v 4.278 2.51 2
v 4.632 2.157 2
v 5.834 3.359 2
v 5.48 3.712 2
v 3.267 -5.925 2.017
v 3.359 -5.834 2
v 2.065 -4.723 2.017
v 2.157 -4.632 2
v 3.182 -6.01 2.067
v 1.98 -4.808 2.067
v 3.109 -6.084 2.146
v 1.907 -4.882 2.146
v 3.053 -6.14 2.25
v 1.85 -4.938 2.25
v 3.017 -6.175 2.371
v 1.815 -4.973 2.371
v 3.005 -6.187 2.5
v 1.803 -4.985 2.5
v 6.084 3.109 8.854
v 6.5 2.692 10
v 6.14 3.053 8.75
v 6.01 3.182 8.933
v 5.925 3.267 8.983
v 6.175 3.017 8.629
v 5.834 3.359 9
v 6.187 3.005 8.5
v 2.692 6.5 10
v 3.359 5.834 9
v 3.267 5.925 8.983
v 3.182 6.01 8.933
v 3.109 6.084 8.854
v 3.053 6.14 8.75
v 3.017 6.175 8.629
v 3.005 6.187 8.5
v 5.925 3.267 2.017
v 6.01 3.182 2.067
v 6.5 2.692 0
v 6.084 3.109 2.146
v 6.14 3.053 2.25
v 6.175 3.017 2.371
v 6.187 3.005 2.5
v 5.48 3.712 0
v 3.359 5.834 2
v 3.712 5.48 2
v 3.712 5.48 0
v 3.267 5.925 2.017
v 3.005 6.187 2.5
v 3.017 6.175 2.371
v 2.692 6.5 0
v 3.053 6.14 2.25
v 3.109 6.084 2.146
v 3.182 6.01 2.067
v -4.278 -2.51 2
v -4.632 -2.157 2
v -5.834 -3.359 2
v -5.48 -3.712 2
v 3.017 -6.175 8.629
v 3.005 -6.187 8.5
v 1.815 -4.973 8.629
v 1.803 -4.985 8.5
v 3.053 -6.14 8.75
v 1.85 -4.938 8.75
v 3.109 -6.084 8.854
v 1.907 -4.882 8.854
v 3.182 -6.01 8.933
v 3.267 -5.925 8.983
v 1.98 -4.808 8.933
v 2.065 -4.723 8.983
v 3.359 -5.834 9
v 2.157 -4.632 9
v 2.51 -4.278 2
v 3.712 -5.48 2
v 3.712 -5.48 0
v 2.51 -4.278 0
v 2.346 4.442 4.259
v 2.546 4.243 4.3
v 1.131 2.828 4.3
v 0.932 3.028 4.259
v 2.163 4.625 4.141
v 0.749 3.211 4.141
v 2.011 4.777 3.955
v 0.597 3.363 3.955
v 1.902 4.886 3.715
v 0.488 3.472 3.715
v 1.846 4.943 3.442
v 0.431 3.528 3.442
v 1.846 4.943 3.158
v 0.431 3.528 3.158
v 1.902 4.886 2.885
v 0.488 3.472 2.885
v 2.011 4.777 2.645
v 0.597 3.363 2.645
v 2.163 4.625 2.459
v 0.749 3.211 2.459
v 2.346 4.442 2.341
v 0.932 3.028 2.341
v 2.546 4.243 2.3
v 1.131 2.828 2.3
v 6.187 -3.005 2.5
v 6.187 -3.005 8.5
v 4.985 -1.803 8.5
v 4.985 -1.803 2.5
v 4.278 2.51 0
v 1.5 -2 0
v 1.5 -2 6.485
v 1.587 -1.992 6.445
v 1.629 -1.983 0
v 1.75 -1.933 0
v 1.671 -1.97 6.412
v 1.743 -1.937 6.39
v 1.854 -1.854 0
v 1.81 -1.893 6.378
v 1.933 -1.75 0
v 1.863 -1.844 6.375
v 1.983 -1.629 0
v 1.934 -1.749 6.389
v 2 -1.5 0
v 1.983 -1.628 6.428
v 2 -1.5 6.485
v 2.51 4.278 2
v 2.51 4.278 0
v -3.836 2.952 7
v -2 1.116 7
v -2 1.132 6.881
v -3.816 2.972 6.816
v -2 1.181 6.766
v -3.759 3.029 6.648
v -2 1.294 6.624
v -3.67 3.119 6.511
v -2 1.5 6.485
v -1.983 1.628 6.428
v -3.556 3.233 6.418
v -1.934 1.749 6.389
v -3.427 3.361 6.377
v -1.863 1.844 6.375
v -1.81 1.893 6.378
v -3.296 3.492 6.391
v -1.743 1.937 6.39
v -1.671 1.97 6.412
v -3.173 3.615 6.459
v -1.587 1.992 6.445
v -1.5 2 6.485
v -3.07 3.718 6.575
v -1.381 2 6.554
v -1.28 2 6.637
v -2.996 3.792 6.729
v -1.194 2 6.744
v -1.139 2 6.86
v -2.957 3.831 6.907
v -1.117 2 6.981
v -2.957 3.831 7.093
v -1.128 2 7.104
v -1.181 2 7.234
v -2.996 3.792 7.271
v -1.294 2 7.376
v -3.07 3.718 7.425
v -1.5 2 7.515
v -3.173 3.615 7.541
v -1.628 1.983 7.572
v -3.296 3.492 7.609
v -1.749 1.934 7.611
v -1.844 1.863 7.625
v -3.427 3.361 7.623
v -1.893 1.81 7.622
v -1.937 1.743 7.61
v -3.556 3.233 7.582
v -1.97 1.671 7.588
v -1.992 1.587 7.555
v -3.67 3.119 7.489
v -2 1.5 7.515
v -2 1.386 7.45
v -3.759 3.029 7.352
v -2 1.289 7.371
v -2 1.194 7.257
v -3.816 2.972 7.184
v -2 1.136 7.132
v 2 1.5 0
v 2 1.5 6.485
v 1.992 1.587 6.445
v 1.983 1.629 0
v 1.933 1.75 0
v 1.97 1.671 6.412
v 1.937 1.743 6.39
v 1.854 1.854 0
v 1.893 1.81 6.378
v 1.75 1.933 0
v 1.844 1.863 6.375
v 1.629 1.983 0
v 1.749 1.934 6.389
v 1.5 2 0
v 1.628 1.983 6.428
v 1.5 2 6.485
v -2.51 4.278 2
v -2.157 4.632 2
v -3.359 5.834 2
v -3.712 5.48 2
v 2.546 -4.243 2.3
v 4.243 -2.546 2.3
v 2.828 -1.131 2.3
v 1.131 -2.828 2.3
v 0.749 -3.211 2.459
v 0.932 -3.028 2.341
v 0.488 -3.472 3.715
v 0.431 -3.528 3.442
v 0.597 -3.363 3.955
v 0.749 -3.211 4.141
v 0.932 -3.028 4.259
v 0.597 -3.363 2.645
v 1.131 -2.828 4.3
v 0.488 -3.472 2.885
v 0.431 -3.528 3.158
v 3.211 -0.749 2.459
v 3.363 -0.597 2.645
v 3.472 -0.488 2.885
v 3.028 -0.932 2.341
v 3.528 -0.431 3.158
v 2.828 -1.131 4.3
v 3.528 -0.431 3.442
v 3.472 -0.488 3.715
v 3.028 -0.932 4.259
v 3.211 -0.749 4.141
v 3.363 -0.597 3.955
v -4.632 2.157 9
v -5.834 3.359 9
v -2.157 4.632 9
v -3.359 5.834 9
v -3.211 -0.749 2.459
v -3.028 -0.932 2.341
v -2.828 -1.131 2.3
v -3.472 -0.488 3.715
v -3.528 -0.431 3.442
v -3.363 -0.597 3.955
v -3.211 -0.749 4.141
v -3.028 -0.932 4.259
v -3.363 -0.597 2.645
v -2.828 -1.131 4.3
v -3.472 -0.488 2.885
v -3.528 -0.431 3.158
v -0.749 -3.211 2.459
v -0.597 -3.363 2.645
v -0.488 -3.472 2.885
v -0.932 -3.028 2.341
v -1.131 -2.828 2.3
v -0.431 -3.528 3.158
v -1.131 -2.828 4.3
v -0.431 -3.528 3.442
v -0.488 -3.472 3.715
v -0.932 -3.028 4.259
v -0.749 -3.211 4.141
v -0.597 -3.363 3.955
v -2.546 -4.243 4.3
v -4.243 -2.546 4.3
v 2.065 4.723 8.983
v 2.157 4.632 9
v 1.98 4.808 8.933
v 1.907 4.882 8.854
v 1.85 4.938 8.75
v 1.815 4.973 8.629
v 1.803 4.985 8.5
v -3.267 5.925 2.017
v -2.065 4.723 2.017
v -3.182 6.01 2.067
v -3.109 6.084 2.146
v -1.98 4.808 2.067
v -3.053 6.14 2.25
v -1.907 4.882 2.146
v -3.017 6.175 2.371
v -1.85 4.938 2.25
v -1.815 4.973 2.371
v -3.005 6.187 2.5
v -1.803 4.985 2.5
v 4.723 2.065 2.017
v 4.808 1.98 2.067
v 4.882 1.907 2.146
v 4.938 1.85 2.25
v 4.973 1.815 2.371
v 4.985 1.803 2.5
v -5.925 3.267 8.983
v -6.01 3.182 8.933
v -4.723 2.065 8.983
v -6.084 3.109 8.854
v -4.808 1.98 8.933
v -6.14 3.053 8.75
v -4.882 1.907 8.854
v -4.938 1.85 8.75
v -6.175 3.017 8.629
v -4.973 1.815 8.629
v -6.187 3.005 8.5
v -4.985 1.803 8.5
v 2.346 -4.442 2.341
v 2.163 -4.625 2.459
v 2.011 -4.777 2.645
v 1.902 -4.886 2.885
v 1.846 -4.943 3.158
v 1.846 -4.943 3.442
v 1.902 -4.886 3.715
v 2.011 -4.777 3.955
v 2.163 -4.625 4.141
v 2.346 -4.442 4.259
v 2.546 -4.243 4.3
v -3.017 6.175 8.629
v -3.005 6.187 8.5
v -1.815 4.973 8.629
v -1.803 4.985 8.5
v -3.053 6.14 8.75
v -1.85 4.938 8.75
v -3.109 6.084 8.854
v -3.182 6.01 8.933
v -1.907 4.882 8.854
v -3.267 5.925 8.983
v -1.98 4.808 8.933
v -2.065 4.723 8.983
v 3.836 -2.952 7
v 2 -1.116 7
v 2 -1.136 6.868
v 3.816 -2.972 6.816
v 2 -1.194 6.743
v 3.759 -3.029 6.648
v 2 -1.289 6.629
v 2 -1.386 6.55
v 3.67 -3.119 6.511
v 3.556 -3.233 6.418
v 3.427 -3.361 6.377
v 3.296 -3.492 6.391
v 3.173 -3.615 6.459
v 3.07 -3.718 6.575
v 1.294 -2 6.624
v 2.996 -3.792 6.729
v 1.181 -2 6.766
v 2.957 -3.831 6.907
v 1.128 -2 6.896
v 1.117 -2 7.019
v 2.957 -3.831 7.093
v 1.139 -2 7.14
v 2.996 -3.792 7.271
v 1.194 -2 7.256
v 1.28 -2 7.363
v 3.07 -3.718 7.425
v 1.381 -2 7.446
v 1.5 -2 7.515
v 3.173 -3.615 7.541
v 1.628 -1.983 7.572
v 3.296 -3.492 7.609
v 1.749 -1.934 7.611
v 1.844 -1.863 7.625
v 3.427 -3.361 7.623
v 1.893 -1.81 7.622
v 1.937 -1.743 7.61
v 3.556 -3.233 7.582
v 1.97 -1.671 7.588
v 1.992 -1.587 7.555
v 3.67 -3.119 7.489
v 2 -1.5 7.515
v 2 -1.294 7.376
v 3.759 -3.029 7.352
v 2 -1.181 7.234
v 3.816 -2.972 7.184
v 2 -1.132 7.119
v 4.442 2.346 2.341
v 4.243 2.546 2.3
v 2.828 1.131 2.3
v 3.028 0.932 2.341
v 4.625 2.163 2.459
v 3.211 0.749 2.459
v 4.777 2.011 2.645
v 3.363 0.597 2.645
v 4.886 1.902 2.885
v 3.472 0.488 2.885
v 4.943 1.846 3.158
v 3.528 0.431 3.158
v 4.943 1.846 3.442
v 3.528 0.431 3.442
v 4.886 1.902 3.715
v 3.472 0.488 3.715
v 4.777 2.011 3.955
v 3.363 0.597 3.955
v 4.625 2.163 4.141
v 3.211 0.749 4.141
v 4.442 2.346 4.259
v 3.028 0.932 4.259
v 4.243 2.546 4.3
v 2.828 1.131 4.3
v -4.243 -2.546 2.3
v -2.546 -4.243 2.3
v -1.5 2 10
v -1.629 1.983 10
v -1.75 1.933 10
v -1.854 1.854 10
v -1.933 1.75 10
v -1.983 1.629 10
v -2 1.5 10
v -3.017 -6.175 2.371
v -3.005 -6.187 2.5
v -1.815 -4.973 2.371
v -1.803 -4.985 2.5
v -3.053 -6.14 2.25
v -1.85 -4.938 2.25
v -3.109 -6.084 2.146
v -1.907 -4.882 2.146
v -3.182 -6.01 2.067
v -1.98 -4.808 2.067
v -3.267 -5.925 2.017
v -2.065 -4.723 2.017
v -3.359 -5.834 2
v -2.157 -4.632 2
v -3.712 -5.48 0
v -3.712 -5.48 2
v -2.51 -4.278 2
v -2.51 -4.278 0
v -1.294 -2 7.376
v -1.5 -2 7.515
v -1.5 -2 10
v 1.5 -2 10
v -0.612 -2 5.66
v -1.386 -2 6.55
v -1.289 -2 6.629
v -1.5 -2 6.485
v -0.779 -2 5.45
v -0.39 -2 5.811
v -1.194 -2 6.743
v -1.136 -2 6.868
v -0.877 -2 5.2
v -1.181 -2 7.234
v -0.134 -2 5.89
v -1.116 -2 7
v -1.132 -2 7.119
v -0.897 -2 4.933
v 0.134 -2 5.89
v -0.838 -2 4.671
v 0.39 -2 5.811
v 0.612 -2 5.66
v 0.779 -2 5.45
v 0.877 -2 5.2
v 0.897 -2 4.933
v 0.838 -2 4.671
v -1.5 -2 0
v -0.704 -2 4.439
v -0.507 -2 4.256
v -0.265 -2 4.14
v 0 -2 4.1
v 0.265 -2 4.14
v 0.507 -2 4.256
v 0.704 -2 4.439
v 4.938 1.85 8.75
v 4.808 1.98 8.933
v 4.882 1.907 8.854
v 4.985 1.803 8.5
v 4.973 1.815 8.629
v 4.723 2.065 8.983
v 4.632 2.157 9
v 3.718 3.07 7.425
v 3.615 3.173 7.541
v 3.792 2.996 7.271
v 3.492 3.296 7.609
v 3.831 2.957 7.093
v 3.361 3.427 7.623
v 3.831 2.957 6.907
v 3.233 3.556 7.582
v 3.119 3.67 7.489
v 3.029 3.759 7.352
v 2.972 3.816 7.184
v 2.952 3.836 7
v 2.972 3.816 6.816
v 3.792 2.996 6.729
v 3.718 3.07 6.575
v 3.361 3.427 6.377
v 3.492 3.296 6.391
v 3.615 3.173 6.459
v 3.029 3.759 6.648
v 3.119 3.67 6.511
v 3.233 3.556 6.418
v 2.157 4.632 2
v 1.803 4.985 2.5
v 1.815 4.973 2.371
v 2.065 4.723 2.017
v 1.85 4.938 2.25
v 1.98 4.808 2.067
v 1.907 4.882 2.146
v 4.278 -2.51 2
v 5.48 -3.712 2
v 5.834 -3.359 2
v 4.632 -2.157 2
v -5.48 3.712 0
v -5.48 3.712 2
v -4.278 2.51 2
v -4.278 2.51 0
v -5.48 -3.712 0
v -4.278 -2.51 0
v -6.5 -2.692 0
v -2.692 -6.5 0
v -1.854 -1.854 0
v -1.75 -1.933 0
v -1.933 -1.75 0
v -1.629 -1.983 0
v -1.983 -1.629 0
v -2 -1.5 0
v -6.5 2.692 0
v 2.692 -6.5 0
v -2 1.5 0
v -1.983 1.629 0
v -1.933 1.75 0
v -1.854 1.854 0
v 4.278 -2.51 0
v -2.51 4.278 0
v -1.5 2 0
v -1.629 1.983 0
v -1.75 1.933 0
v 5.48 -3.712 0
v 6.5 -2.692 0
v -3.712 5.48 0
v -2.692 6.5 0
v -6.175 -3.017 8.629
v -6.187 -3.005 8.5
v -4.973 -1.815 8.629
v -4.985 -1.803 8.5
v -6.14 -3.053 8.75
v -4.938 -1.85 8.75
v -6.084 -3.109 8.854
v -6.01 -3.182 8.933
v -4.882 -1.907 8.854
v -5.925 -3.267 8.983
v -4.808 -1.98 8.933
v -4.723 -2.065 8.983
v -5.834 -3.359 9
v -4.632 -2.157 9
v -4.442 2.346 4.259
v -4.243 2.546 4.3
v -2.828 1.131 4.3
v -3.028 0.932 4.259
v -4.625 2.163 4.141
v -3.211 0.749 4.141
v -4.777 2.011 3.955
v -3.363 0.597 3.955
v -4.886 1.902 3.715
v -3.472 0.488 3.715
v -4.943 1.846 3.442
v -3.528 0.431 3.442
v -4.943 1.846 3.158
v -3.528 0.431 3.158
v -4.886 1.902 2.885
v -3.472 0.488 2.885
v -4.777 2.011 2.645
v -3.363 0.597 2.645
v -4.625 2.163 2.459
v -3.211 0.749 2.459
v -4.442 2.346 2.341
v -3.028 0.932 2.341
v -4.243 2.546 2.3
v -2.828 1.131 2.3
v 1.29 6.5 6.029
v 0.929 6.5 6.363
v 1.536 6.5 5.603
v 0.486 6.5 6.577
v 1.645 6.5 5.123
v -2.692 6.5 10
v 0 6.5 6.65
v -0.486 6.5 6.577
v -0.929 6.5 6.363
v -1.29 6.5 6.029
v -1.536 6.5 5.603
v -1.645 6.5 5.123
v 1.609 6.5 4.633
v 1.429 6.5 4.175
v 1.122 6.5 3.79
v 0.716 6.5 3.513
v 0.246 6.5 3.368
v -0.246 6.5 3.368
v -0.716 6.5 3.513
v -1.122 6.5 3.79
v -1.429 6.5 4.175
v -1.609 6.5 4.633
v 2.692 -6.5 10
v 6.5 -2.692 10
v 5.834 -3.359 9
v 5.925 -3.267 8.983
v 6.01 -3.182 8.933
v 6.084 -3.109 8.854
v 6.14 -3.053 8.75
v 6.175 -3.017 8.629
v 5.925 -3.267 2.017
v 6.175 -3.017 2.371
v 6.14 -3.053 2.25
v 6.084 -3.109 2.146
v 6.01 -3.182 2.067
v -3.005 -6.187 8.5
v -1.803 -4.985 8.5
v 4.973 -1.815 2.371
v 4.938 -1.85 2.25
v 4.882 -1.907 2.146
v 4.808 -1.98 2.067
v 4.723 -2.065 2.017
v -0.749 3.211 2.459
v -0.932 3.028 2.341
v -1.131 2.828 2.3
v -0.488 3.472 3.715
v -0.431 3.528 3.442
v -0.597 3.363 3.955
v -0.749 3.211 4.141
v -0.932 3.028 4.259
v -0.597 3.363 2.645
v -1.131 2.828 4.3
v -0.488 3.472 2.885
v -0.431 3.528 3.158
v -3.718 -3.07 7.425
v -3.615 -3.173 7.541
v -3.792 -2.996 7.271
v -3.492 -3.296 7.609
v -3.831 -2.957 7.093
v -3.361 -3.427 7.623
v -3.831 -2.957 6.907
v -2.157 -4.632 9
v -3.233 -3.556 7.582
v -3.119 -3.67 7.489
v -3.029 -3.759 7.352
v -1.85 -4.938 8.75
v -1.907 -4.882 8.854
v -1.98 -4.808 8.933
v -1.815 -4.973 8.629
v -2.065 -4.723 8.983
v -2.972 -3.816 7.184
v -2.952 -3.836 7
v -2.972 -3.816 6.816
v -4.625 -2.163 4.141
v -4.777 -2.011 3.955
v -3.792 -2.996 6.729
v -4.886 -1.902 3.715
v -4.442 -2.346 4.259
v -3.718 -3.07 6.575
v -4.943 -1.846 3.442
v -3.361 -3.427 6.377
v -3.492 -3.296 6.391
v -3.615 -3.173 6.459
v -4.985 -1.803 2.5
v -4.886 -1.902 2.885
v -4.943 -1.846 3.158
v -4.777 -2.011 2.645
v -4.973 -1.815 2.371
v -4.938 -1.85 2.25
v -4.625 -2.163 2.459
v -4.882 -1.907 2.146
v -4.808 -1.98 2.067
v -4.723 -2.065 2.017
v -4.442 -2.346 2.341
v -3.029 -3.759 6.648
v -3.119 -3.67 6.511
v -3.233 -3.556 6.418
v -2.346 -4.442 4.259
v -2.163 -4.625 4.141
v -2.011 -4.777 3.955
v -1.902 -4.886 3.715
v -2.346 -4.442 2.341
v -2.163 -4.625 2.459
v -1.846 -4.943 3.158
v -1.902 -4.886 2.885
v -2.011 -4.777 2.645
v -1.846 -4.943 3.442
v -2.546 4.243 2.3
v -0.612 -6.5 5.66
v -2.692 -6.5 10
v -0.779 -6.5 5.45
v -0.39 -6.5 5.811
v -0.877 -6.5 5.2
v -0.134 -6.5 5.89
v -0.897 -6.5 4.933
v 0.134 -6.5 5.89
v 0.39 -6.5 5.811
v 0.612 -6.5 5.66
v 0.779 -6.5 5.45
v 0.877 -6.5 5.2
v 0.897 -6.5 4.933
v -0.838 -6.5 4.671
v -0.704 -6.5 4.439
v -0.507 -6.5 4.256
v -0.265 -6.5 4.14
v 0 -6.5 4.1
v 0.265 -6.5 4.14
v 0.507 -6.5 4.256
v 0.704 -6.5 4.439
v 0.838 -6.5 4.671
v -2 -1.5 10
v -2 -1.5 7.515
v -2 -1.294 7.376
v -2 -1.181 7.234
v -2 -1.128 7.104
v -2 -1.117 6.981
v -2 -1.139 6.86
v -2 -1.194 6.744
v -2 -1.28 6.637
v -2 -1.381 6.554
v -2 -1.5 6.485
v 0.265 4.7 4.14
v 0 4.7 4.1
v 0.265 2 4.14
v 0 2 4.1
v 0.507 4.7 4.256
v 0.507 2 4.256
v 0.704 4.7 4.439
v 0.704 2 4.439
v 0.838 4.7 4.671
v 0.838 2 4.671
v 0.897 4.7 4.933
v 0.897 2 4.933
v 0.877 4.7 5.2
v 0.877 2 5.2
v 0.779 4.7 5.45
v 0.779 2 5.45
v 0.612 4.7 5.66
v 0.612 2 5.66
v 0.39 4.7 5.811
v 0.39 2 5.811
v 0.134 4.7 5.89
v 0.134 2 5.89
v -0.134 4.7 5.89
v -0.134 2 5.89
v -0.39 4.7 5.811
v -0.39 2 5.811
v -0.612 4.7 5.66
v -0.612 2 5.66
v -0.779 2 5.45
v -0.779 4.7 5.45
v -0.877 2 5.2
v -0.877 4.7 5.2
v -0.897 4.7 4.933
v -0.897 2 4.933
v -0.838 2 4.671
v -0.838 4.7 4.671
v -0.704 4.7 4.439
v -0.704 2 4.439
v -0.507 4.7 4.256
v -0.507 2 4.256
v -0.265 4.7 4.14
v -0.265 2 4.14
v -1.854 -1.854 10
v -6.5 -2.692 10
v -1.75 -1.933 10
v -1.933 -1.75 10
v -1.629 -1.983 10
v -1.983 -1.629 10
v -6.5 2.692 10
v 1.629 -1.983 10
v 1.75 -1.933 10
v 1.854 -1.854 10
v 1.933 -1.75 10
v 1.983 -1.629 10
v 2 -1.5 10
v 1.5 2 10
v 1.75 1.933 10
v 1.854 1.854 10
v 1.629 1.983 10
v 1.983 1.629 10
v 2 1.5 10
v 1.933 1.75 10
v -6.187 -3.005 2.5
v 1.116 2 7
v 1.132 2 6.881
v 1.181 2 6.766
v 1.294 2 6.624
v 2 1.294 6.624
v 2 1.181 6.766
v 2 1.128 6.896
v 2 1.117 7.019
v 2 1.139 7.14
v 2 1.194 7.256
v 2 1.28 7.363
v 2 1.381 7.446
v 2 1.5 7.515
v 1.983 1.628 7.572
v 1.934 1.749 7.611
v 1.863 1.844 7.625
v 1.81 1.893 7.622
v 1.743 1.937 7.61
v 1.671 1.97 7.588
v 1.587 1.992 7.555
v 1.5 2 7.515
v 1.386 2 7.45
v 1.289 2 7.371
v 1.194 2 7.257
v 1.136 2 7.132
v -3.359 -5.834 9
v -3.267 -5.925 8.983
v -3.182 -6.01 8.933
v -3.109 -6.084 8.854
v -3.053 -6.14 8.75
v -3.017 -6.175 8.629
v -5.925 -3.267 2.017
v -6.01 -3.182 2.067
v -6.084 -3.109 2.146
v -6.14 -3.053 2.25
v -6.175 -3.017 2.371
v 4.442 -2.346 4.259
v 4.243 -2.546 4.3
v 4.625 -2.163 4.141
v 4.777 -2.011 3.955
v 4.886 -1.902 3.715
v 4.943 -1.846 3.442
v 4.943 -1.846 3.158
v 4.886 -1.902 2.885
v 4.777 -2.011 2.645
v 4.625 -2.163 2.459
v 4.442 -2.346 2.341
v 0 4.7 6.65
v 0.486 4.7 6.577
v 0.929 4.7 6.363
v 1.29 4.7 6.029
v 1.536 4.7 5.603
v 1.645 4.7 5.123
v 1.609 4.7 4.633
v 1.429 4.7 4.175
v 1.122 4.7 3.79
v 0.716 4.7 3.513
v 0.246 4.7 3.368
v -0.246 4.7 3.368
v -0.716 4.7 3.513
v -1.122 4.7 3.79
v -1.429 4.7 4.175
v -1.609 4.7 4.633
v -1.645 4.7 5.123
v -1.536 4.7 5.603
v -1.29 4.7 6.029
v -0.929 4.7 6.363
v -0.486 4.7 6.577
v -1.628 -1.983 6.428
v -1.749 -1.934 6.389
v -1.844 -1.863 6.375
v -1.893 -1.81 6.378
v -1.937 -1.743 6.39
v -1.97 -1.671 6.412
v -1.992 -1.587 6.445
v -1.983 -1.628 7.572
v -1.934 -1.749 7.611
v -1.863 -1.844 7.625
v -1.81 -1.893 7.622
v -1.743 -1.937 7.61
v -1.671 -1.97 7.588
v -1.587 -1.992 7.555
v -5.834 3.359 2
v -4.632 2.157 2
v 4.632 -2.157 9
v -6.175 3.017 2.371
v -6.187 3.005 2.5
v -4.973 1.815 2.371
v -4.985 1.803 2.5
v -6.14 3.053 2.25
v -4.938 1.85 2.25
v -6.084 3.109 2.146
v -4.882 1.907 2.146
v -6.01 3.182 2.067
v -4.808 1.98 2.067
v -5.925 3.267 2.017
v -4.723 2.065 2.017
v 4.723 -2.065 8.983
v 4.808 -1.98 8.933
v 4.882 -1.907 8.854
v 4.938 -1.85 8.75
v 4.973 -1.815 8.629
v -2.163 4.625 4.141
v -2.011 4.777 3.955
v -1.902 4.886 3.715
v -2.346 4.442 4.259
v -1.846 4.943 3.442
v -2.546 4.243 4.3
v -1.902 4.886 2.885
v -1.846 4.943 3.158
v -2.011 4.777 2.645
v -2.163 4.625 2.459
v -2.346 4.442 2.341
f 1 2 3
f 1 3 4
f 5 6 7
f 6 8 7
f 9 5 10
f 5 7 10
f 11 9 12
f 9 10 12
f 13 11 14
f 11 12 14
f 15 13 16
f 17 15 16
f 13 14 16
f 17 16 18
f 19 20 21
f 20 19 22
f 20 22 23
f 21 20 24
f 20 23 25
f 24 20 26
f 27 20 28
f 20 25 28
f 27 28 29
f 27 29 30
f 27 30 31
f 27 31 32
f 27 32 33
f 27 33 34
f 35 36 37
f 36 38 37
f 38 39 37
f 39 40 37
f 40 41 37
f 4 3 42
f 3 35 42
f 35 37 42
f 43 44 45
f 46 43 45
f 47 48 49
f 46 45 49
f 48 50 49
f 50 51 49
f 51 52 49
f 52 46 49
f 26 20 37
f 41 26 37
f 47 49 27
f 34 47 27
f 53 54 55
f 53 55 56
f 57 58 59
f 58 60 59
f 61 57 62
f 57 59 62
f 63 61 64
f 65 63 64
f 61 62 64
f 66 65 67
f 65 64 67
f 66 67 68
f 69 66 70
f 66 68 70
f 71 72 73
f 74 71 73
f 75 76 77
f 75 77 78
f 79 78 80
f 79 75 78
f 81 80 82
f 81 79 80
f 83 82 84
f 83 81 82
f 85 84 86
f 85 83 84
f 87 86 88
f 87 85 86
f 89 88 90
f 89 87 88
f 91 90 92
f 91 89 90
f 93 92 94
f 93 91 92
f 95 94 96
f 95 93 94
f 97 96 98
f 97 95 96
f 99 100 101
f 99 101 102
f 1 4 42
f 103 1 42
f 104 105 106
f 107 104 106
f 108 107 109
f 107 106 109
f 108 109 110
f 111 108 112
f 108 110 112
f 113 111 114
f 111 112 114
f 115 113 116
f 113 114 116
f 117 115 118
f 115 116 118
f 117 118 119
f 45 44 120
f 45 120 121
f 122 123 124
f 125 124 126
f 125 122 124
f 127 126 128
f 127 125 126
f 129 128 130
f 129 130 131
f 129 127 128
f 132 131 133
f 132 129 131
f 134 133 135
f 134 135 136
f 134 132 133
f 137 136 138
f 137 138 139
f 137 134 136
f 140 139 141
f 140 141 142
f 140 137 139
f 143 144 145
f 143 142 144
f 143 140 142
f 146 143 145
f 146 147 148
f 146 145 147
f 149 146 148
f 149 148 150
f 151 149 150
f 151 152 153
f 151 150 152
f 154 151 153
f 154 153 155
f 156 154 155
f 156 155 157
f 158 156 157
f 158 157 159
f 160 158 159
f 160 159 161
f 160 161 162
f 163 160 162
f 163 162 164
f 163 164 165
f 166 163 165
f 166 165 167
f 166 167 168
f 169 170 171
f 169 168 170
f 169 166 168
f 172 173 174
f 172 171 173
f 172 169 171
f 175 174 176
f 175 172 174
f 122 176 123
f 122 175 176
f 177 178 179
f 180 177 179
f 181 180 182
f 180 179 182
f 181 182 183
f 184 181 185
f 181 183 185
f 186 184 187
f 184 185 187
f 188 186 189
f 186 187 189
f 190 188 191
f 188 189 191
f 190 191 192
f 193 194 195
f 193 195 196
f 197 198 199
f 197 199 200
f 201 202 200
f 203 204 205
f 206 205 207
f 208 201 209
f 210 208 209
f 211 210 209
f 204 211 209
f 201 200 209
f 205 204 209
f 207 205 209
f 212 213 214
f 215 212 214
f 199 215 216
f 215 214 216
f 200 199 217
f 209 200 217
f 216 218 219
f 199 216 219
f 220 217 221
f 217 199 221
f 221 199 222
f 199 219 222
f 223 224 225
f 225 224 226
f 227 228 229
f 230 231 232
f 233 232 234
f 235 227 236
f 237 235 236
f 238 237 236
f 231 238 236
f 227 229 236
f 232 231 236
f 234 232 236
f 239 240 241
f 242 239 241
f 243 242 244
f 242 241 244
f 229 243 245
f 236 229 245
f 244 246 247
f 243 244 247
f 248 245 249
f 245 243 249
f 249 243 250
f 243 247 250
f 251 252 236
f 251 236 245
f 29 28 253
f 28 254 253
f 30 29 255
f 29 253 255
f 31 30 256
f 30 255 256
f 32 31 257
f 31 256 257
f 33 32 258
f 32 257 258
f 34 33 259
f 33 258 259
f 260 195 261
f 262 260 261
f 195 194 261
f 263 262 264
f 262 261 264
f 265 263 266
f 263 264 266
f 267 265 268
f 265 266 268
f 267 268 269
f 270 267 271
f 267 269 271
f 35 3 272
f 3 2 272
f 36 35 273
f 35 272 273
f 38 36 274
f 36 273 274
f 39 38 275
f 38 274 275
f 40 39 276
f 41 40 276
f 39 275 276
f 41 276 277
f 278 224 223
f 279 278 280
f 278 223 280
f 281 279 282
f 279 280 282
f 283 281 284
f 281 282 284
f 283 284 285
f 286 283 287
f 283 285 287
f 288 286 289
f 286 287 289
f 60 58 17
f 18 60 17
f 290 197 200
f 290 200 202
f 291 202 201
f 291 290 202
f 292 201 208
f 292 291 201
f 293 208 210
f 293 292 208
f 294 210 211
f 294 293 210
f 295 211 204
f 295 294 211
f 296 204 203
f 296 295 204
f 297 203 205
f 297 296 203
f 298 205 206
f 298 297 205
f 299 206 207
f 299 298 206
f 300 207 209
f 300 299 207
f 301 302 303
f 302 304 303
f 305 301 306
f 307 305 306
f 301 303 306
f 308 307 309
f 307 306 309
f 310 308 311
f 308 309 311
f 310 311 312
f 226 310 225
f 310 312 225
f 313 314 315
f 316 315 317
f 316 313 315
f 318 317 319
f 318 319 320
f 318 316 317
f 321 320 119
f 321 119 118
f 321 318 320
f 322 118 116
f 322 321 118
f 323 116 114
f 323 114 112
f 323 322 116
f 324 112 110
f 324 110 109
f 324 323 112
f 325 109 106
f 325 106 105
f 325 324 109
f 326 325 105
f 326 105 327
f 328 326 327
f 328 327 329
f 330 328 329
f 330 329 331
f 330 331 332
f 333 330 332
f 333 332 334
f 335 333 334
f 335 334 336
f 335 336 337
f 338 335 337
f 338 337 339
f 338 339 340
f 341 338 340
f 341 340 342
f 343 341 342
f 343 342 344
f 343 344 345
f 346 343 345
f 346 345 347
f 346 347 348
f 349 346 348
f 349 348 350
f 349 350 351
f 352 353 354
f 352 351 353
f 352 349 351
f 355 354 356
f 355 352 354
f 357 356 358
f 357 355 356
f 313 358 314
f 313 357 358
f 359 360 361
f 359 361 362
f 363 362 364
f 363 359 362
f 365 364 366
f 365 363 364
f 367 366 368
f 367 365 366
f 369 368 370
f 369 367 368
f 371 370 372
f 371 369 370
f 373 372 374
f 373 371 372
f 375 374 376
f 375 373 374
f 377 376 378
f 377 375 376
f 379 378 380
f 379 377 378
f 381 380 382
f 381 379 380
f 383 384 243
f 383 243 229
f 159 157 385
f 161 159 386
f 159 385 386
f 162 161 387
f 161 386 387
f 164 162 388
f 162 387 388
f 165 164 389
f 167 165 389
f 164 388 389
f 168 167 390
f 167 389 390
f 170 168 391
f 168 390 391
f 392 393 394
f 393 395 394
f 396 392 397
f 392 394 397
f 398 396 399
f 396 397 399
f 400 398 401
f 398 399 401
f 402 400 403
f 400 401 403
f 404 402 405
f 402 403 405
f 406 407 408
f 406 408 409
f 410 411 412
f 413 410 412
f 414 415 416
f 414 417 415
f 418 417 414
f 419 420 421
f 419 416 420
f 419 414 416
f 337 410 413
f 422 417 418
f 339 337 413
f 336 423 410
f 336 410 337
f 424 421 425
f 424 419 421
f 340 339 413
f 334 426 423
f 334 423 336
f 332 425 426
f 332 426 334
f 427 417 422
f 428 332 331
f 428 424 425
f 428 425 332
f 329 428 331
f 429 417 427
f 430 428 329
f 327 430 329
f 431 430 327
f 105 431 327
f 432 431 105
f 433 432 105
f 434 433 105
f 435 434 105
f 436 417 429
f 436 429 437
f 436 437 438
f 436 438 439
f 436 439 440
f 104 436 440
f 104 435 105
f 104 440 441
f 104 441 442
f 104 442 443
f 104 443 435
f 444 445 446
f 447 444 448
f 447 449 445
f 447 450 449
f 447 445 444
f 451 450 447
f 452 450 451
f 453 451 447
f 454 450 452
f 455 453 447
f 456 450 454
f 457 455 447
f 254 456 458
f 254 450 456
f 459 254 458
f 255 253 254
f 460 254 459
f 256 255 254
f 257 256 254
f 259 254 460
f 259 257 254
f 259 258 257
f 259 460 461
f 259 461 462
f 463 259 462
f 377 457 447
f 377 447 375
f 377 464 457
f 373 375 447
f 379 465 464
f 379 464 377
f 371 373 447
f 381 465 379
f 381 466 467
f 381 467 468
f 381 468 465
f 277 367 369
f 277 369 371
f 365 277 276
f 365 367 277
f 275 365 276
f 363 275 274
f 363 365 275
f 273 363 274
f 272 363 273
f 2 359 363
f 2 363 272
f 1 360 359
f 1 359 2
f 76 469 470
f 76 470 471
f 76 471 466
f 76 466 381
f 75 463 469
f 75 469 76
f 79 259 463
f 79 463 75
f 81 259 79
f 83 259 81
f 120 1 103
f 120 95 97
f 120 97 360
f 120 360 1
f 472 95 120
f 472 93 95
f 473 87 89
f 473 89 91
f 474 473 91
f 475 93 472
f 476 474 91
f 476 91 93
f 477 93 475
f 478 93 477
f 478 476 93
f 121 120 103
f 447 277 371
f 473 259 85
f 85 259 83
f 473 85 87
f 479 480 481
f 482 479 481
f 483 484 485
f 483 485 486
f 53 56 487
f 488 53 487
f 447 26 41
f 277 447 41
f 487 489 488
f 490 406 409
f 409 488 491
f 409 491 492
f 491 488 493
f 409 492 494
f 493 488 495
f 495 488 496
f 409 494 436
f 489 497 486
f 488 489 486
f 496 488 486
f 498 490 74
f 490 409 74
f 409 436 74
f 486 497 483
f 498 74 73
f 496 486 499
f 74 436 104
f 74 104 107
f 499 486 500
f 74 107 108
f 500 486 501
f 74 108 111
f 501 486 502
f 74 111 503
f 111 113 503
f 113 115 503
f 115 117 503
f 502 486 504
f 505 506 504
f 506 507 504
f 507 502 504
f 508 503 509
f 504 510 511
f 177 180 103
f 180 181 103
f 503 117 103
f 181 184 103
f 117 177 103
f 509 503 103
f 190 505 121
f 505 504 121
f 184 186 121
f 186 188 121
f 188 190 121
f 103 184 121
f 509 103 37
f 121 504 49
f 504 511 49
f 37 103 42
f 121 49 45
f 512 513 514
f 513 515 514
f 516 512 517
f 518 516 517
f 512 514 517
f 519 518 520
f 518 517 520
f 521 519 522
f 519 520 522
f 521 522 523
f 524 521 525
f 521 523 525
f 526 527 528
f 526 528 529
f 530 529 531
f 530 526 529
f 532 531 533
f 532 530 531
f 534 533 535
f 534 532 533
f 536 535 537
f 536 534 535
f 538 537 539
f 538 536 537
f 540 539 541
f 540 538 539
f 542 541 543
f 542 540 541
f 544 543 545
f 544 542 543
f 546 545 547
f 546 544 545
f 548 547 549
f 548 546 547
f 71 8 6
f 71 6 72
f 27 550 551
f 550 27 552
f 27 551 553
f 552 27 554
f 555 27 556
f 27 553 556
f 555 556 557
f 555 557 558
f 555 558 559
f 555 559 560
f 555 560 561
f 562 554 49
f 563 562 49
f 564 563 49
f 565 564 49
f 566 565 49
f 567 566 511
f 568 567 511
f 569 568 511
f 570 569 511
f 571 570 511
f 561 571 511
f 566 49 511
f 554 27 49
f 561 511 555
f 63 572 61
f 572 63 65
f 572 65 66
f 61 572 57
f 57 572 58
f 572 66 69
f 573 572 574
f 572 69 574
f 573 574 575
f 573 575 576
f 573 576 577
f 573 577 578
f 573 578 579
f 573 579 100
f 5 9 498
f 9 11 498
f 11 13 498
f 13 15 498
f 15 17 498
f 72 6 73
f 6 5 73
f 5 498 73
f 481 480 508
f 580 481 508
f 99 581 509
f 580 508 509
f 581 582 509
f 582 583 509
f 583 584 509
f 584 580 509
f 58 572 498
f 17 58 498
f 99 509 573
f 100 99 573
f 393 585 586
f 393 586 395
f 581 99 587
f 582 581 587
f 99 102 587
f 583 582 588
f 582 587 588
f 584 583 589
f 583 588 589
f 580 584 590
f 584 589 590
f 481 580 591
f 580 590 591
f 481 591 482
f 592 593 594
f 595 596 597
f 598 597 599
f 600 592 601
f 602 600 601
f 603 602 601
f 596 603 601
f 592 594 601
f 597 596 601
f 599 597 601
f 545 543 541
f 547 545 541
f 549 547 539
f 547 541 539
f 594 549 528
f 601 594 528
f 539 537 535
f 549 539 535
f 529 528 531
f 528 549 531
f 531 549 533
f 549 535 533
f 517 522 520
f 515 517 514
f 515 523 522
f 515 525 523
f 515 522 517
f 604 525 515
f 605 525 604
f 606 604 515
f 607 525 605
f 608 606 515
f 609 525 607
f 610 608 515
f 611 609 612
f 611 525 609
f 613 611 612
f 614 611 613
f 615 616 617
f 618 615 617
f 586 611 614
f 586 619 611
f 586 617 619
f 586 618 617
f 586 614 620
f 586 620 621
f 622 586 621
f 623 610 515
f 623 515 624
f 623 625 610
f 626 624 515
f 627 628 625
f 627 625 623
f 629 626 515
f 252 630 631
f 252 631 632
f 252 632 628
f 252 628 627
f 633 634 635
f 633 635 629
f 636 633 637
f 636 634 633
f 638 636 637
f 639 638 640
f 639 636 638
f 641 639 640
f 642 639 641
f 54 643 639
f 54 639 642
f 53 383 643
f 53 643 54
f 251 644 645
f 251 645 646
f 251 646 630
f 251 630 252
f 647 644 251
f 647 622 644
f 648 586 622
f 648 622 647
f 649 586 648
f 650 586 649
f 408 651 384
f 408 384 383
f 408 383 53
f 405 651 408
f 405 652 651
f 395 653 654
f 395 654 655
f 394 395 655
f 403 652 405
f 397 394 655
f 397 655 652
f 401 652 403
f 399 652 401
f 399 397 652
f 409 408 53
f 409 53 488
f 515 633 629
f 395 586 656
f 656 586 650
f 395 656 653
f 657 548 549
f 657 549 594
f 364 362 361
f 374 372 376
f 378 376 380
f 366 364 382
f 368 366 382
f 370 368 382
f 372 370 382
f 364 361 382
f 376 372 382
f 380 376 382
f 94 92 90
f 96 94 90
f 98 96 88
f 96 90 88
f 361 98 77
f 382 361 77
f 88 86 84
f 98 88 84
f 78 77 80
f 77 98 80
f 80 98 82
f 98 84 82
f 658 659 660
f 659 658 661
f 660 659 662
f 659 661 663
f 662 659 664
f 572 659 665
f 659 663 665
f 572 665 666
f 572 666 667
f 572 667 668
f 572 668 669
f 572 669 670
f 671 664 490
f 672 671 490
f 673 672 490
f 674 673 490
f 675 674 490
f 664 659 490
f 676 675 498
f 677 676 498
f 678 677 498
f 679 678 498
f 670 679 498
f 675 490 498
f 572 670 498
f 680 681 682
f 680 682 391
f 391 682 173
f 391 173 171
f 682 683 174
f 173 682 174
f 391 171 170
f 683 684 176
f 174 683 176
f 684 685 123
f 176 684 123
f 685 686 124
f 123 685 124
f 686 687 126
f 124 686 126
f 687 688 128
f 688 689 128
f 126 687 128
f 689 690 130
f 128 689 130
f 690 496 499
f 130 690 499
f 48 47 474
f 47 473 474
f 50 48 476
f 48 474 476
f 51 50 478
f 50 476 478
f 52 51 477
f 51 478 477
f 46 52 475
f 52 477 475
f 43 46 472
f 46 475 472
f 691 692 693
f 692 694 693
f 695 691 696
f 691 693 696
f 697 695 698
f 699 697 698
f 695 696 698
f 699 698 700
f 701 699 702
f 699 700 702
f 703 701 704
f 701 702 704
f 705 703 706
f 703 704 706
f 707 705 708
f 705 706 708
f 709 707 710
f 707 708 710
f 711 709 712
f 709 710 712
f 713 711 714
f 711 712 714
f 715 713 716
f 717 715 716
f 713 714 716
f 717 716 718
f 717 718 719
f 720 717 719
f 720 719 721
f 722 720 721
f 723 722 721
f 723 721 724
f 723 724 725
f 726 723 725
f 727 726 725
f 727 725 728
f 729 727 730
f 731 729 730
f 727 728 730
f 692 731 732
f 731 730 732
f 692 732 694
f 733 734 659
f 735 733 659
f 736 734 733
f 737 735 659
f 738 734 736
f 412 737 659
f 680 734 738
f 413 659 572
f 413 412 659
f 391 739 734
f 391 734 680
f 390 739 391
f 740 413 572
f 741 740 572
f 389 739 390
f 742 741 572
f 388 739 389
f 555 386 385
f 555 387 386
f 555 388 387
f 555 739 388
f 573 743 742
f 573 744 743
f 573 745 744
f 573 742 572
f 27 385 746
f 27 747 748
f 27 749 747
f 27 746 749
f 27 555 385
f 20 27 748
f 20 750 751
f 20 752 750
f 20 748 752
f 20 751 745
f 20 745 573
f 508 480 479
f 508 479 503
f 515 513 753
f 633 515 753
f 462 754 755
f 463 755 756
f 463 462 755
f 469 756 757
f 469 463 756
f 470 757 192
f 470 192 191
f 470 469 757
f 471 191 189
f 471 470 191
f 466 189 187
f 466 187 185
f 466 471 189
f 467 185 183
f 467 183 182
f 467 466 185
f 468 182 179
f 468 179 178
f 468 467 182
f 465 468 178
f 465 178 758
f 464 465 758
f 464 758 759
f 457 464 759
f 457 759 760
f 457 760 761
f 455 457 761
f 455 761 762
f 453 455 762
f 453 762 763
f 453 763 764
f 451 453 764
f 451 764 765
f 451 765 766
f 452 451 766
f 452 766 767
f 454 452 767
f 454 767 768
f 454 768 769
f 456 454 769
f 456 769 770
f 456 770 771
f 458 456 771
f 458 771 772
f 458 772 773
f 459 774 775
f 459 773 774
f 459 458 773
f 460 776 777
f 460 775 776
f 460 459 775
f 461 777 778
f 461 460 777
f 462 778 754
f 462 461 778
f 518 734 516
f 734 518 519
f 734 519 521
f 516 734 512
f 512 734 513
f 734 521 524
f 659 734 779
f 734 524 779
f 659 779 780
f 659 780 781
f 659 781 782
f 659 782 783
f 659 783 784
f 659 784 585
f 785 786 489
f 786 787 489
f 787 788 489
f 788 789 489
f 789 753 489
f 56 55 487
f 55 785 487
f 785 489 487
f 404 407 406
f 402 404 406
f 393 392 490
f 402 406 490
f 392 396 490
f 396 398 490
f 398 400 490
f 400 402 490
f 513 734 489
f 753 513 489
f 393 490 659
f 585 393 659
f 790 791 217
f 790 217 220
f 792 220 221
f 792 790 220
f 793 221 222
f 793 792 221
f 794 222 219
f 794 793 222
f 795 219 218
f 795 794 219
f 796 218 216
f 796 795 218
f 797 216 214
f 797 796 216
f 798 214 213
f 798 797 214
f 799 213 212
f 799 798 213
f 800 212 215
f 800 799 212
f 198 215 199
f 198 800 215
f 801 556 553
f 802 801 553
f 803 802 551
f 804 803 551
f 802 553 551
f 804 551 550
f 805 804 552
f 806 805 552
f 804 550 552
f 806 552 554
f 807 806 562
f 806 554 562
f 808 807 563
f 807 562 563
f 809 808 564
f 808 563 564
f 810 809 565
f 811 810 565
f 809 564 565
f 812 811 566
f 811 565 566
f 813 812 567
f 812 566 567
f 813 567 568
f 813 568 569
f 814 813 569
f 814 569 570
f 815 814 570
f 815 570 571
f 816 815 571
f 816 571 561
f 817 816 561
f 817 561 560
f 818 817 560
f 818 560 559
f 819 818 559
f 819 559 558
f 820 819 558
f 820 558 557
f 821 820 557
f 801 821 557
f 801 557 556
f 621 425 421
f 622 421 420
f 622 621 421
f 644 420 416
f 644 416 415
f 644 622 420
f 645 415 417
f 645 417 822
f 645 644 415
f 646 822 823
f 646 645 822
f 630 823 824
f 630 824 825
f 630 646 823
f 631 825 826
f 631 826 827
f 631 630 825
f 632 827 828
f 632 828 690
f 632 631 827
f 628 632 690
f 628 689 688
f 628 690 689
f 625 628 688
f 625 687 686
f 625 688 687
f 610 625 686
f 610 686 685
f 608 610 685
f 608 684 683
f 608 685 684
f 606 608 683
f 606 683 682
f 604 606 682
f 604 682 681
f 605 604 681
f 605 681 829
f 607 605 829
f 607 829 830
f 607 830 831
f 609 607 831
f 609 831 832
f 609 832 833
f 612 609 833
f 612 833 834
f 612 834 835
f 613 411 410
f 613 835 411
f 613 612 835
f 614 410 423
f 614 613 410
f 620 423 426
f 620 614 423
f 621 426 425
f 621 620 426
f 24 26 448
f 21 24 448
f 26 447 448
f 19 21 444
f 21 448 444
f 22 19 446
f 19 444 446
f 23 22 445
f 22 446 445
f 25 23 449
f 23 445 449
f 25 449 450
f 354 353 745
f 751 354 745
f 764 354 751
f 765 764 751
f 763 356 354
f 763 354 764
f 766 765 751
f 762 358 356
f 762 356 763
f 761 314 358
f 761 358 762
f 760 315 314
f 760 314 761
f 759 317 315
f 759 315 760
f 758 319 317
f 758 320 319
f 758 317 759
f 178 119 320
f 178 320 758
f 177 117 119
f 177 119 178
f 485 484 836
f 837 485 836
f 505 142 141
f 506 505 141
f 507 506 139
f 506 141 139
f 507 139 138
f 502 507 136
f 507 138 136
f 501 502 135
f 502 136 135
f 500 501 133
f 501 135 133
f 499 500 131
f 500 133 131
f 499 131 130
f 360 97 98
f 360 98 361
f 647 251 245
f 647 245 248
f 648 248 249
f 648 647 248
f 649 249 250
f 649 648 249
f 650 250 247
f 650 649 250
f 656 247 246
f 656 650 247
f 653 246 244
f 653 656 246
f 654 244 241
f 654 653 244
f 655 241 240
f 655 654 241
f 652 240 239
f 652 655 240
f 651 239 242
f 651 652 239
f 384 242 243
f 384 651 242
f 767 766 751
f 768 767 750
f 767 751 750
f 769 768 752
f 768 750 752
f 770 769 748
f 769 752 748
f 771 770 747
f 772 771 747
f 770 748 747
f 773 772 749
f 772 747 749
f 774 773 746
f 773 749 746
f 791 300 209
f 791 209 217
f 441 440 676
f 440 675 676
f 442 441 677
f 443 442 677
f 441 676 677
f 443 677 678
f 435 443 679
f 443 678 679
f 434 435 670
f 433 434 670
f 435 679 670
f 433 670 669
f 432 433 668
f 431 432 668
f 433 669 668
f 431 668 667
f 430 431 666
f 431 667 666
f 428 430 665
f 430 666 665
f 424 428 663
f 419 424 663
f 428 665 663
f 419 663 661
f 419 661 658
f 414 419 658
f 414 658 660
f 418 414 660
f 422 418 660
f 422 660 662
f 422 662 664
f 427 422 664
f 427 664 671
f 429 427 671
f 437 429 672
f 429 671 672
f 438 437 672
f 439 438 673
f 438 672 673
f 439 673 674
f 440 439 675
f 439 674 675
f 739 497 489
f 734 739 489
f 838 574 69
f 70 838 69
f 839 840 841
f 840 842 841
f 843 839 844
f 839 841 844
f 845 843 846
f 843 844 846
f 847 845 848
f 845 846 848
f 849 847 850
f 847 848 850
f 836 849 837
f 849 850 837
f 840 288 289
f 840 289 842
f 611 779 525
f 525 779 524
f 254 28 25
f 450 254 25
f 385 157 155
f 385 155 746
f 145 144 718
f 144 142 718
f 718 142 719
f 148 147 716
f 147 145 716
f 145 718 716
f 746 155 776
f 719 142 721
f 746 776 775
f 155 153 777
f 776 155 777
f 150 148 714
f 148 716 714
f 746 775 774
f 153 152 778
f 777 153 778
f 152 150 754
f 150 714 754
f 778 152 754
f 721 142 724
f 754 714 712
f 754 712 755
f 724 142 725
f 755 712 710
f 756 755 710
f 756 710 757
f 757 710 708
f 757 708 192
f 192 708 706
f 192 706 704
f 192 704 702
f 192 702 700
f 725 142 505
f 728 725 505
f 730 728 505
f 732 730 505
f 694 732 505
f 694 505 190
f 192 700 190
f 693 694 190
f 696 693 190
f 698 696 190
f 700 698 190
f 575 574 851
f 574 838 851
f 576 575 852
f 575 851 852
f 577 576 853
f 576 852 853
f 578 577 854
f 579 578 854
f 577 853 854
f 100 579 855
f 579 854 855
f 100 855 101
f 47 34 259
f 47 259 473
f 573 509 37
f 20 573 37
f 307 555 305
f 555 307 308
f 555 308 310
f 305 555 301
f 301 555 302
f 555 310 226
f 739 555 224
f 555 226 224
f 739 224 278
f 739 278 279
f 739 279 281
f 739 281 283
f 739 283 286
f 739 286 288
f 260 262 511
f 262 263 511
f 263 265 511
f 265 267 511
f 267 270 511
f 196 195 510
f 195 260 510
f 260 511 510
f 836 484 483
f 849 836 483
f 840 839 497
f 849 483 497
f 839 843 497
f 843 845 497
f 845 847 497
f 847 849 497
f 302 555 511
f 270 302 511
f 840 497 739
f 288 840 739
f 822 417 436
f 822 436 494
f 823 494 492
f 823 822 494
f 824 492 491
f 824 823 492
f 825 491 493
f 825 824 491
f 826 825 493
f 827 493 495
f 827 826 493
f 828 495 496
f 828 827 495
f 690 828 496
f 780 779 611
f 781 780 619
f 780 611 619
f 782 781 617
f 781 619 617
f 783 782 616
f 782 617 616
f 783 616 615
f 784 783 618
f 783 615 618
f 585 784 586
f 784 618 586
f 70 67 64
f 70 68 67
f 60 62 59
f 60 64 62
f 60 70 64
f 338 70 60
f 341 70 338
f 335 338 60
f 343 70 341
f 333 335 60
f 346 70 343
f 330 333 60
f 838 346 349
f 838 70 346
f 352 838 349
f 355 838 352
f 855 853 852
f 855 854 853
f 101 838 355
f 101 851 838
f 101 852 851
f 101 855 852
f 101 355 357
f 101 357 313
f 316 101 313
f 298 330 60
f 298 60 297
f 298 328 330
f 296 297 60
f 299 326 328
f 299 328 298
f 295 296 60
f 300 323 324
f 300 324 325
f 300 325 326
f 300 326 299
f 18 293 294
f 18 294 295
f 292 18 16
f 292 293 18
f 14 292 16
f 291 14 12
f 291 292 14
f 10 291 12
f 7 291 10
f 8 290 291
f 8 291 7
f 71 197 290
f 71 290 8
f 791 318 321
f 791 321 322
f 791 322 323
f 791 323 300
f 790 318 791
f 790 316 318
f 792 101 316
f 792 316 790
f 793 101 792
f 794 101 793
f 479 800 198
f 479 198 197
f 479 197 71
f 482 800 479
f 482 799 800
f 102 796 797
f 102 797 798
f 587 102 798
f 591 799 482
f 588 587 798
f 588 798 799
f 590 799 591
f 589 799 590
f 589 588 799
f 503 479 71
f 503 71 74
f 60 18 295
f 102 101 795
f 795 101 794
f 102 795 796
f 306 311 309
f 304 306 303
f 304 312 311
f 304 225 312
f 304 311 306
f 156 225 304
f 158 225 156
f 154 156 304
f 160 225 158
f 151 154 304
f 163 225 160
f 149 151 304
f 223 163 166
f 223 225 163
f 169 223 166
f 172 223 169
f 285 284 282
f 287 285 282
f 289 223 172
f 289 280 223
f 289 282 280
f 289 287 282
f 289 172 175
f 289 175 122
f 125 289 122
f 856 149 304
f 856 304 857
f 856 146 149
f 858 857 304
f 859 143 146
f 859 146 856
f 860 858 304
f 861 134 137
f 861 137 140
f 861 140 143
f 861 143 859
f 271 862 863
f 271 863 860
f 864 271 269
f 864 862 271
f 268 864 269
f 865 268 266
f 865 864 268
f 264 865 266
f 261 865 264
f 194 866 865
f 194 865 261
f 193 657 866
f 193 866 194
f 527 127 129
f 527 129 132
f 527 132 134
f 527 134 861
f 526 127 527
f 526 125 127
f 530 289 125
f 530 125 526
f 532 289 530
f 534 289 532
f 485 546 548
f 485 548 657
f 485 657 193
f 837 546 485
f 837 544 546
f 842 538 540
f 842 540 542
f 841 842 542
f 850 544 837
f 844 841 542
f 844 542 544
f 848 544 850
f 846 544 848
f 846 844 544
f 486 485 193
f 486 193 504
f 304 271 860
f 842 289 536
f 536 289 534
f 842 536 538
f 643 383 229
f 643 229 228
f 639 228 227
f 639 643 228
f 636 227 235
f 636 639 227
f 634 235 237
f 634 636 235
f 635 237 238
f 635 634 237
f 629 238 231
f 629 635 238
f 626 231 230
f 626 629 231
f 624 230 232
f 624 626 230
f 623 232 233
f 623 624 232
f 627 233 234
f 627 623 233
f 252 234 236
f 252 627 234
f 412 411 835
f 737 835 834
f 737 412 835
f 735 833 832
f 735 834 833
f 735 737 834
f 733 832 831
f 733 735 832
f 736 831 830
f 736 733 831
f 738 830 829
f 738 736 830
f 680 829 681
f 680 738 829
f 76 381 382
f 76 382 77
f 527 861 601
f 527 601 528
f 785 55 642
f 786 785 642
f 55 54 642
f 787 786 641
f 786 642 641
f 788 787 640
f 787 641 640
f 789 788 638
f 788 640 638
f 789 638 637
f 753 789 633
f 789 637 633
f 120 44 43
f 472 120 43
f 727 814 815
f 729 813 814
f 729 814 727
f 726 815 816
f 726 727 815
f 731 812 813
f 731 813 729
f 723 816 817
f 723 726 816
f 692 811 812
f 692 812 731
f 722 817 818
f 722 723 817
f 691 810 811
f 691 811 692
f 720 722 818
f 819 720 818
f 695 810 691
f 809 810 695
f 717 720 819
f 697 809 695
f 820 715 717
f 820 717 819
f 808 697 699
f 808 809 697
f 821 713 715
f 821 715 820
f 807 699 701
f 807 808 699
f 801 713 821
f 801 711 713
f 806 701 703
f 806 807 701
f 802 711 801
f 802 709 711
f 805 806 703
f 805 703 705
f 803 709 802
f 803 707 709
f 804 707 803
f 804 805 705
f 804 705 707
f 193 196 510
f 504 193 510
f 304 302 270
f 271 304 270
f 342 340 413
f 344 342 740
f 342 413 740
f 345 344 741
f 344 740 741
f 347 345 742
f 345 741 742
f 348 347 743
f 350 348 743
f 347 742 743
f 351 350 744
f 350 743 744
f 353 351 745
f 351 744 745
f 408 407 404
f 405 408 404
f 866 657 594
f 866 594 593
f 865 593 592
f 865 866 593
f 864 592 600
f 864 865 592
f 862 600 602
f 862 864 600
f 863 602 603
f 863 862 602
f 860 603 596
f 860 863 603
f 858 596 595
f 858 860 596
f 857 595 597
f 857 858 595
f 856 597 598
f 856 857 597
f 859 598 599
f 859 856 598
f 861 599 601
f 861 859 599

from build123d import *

# Parameters (mm, degrees)
SKETCH1_W                                            = 4
SKETCH1_H                                            = 4
BOSS_EXTRUDE1_DEPTH                                  = 10
FILLET2_R                                            = 0.5
CUT_EXTRUDE3_DEPTH                                   = 1.7
FILLET3_R                                            = 0.5
CUT_EXTRUDE4_DEPTH                                   = 2
CIRPATTERN14_COUNT                                   = 4
FILLET3_OF_CIRPATTERN14_R                            = 0.5
CBORE_FOR_M1_6_HEXAGON_SOCKET_HEAD_CAP_S_D           = 1.8
CBORE_FOR_M1_6_HEXAGON_SOCKET_HEAD_CAP_S_CBORE_D     = 3.3
CBORE_FOR_M1_6_HEXAGON_SOCKET_HEAD_CAP_S_CBORE_DEPTH = 1.8


with BuildPart() as part:
    # Sketch1 → Boss-Extrude1 (new body)
    with BuildSketch(Plane.XY):
        Polygon((-2.692388155, 6.5), (-6.5, 2.692388155), (-6.5, -2.692388155), (-2.692388155, -6.5), (2.692388155, -6.5), (6.5, -2.692388155), (6.5, 2.692388155), (2.692388155, 6.5), align=None)
        Rectangle(SKETCH1_W, SKETCH1_H, mode=Mode.SUBTRACT)
    extrude(amount=BOSS_EXTRUDE1_DEPTH)

    # Fillet2
    fillet2_edges = [part.edges().sort_by_distance(p)[0] for p in [
        (-2, -2, 5),
        (2, -2, 5),
        (2, 2, 5),
        (-2, 2, 5),
    ]]
    fillet(fillet2_edges, radius=FILLET2_R)

    # Sketch11 → Cut-Extrude3 (cut)
    with BuildSketch(Plane(origin=(4.596194078, 4.596194078, 0), x_dir=(0, 0, -1), z_dir=(0.7071067811865477, 0.7071067811865475, 0))):
        Polygon((-2, 2.25), (-9, 2.25), (-9, -2.25), (-2, -2.25), (-2, -1.25), (0, -1.25), (0, 1.25), (-2, 1.25), align=None)
    cut_extrude3 = extrude(amount=-CUT_EXTRUDE3_DEPTH, mode=Mode.SUBTRACT)

    # Fillet3
    fillet3_edges = [part.edges().sort_by_distance(p)[0] for p in [
        (5.586143571, 2.404163056, 9),
        (5.586143571, 2.404163056, 2),
        (2.404163056, 5.586143571, 2),
        (2.404163056, 5.586143571, 9),
    ]]
    fillet(fillet3_edges, radius=FILLET3_R)

    # Sketch13 → Tap Drill for M1.6 Tap2 (revolve, cut)
    with BuildSketch(Plane(origin=(3.39411255, 3.39411255, 7), x_dir=(-0.7071067811865475, 0.7071067811865477, 0), z_dir=(0, 0, 1))):
        Polygon((0, 0), (0, 5.375537887), (0.625, 5), (0.625, 0), align=None)
    tap_drill_for_m1_6_tap2 = revolve(axis=Axis((7.88424061, 7.88424061, 7), (-0.7071067811865477, -0.7071067811865475, 0)), mode=Mode.SUBTRACT)

    # Sketch14 → Cut-Extrude4 (cut)
    with BuildSketch(Plane(origin=(3.39411255, 3.39411255, 0), x_dir=(0, 0, -1), z_dir=(0.7071067811865476, 0.7071067811865476, 0))):
        with BuildLine():
            Line((-2.3, 1.2), (-2.3, -1.2))
            ThreePointArc((-2.3, -1.2), (-3.3, -2.2), (-4.3, -1.2))
            Line((-4.3, -1.2), (-4.3, 1.2))
            ThreePointArc((-4.3, 1.2), (-3.3, 2.2), (-2.3, 1.2))
        make_face()
    cut_extrude4 = extrude(amount=-CUT_EXTRUDE4_DEPTH, mode=Mode.SUBTRACT)

    # CirPattern14: Cut-Extrude3, Tap Drill for M1.6 Tap2, Cut-Extrude4 ×4 about axis
    cirpattern14_axis = Axis((0, 0, 10.5), (0, 0, -1))
    add([cut_extrude3.rotate(cirpattern14_axis, i * 360 / CIRPATTERN14_COUNT) for i in range(1, CIRPATTERN14_COUNT)], mode=Mode.SUBTRACT)
    add([tap_drill_for_m1_6_tap2.rotate(cirpattern14_axis, i * 360 / CIRPATTERN14_COUNT) for i in range(1, CIRPATTERN14_COUNT)], mode=Mode.SUBTRACT)
    add([cut_extrude4.rotate(cirpattern14_axis, i * 360 / CIRPATTERN14_COUNT) for i in range(1, CIRPATTERN14_COUNT)], mode=Mode.SUBTRACT)

    # Fillet3 of CirPattern14
    fillet3_of_cirpattern14_edges = [part.edges().sort_by_distance(p)[0] for p in [
        (2.404163056, -5.586143571, 9),
        (2.404163056, -5.586143571, 2),
        (5.586143571, -2.404163056, 2),
        (5.586143571, -2.404163056, 9),
        (-5.586143571, -2.404163056, 9),
        (-5.586143571, -2.404163056, 2),
        (-2.404163056, -5.586143571, 2),
        (-2.404163056, -5.586143571, 9),
        (-2.404163056, 5.586143571, 9),
        (-2.404163056, 5.586143571, 2),
        (-5.586143571, 2.404163056, 2),
        (-5.586143571, 2.404163056, 9),
    ]]
    fillet(fillet3_of_cirpattern14_edges, radius=FILLET3_OF_CIRPATTERN14_R)

    # CBORE for M1.6 Hexagon socket head cap screws1 (through all)
    with Locations(Plane(origin=(0, 6.5, 5), x_dir=(0, 0, 1), z_dir=(0, 1, 0))):
        with Locations((0, 0)):
            CounterBoreHole(CBORE_FOR_M1_6_HEXAGON_SOCKET_HEAD_CAP_S_D / 2, CBORE_FOR_M1_6_HEXAGON_SOCKET_HEAD_CAP_S_CBORE_D / 2, CBORE_FOR_M1_6_HEXAGON_SOCKET_HEAD_CAP_S_CBORE_DEPTH)


solid = part.part
